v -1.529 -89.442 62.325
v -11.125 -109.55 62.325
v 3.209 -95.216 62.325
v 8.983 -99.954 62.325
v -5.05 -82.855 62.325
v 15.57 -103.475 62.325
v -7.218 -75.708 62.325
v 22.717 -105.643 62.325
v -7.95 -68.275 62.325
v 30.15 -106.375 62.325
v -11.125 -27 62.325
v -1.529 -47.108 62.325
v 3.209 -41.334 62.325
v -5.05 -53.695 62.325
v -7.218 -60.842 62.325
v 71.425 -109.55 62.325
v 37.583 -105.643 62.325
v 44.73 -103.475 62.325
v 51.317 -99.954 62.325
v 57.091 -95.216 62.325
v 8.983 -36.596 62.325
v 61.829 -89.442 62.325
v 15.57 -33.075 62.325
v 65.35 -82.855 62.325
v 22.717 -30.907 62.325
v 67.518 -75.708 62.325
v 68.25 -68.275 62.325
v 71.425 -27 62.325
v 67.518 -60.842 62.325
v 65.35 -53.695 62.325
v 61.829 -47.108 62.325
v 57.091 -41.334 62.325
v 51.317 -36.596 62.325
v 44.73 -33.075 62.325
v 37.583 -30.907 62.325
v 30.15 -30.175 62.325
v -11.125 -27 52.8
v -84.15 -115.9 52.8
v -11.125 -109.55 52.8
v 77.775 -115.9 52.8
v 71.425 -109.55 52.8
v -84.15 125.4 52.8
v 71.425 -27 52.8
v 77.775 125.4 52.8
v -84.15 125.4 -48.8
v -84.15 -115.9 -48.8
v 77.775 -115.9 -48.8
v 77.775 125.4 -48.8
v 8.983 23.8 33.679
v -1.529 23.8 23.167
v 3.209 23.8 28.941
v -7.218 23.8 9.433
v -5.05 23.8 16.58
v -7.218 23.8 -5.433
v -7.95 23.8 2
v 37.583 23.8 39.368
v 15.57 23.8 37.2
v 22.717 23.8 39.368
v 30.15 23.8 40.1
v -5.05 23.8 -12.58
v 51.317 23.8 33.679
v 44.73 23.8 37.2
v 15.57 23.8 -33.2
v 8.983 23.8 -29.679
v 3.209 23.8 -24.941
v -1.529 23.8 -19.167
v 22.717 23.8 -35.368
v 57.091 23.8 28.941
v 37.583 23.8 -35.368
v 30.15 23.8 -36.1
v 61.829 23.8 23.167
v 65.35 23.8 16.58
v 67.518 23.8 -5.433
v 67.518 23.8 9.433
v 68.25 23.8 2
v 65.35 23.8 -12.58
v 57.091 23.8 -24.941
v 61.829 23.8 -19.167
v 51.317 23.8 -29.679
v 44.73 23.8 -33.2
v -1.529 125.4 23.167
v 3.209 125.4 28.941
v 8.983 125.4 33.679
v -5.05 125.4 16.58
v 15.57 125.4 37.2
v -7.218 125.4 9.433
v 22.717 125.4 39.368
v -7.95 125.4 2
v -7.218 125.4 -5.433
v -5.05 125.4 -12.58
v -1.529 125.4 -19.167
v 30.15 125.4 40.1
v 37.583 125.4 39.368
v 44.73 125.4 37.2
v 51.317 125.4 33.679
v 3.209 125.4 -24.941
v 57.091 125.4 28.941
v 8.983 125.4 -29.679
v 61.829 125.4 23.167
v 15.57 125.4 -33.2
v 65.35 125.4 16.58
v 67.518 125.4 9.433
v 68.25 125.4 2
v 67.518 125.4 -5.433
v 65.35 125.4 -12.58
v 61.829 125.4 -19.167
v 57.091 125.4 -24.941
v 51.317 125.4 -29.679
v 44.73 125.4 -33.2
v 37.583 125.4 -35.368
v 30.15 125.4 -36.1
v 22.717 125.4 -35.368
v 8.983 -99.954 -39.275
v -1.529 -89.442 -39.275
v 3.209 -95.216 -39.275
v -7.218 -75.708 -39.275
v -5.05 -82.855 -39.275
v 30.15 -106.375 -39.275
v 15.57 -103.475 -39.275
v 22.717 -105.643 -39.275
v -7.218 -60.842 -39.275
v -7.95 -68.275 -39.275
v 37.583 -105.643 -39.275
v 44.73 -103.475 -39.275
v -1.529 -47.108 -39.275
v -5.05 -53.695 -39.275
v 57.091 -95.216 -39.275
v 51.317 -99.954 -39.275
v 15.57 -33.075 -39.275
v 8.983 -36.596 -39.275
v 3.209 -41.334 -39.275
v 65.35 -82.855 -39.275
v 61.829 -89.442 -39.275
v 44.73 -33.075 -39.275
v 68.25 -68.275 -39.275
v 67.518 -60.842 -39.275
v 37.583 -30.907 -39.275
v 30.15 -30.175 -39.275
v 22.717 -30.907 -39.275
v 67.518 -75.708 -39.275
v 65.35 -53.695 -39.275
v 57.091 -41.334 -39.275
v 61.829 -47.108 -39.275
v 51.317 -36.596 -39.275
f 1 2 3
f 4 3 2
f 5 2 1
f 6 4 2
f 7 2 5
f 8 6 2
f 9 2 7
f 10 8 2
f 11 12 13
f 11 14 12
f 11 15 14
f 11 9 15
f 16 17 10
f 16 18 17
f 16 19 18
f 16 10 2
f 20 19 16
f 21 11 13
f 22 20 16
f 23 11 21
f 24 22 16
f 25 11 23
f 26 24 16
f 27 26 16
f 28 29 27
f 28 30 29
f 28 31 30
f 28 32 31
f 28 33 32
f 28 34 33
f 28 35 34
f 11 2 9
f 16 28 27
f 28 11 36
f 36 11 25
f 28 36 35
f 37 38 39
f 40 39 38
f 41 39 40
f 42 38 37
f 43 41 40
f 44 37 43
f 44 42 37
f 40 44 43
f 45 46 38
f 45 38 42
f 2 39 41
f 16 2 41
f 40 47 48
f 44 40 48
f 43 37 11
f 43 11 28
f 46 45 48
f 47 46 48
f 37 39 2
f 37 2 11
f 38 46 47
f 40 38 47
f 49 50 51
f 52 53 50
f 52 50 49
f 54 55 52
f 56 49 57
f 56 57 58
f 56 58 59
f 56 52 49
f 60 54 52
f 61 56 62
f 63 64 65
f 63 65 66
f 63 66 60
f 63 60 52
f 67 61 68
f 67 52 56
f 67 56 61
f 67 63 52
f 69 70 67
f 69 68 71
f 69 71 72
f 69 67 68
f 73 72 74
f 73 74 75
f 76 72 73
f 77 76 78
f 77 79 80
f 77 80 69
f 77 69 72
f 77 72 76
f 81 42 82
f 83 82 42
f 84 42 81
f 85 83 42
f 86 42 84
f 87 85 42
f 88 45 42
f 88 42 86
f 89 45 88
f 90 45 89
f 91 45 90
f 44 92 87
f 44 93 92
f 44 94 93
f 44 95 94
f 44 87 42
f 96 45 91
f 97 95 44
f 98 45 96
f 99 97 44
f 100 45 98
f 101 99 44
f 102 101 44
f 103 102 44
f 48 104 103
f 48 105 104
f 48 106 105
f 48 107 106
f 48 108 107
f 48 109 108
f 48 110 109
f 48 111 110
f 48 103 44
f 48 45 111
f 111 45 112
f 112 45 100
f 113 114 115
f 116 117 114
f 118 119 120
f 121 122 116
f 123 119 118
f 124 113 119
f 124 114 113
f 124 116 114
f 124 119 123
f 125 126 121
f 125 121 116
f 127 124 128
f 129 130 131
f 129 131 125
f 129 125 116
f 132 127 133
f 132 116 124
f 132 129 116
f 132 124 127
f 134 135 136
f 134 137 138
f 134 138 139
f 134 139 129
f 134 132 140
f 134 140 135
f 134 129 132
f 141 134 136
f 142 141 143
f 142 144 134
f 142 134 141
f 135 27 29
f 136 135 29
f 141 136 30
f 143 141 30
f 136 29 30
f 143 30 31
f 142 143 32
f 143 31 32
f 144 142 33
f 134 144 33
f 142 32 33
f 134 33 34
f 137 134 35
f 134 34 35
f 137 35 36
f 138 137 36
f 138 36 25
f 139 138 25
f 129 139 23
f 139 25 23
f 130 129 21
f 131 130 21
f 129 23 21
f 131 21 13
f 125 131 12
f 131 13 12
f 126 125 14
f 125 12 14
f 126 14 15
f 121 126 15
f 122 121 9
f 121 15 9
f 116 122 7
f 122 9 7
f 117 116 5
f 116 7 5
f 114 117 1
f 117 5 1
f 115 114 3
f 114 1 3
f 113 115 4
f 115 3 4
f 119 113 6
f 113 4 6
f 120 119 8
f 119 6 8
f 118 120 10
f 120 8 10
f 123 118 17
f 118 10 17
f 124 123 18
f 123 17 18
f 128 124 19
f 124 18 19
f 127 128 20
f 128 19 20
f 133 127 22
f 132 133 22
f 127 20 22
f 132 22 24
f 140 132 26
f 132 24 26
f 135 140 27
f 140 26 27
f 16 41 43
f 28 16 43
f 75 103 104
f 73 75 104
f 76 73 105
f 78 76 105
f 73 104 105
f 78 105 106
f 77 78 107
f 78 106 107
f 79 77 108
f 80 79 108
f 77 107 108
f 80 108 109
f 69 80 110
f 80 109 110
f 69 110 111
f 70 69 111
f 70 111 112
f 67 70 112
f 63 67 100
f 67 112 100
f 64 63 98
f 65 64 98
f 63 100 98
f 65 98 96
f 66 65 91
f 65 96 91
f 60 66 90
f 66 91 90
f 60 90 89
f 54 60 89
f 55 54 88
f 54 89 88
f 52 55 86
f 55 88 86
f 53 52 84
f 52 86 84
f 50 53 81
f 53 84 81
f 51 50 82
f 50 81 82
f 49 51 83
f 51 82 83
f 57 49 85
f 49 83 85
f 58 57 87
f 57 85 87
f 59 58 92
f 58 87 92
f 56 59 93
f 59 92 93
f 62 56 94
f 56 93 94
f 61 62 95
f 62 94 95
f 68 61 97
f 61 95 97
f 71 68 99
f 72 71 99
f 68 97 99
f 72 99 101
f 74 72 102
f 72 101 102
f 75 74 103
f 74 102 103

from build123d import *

# Parameters (mm, degrees)
SKETCH1_W           = 6.375
SKETCH1_H           = 9.5
BOSS_EXTRUDE1_DEPTH = 4
SCALE1_SCALE        = 25.4
SKETCH3_W           = 82.55
SKETCH3_H           = 82.55
BOSS_EXTRUDE2_DEPTH = 9.525
SKETCH4_R           = 38.1
CUT_EXTRUDE1_DEPTH  = 101.6
SKETCH5_R           = 38.1
CUT_EXTRUDE2_DEPTH  = 101.6


with BuildPart() as part:
    # Sketch1 → Boss-Extrude1 (new body)
    with BuildSketch(Plane.XY):
        with Locations((-3.1875, 4.75)):
            Rectangle(SKETCH1_W, SKETCH1_H)
    extrude(amount=BOSS_EXTRUDE1_DEPTH)


with BuildPart() as part_1:
    # Scale1: scaled about (-3.1875, 4.75, 2)
    add(part.part.scale(SCALE1_SCALE).moved(Location((77.775, -115.9, -48.8))))

    # Sketch3 → Boss-Extrude2 (add)
    with BuildSketch(Plane.XY.offset(52.8)):
        with Locations((30.15, -68.275)):
            Rectangle(SKETCH3_W, SKETCH3_H)
    extrude(amount=BOSS_EXTRUDE2_DEPTH)

    # Sketch4 → Cut-Extrude1 (cut)
    with BuildSketch(Plane.XY.offset(62.325)):
        with Locations((30.15, -68.275)):
            Circle(SKETCH4_R)
    extrude(amount=-CUT_EXTRUDE1_DEPTH, mode=Mode.SUBTRACT)

    # Sketch5 → Cut-Extrude2 (cut)
    with BuildSketch(Plane(origin=(0, 125.4, 0), x_dir=(1, 0, 0), z_dir=(0, 1, 0))):
        with Locations((30.15, -2)):
            Circle(SKETCH5_R)
    extrude(amount=-CUT_EXTRUDE2_DEPTH, mode=Mode.SUBTRACT)


solid = part_1.part
